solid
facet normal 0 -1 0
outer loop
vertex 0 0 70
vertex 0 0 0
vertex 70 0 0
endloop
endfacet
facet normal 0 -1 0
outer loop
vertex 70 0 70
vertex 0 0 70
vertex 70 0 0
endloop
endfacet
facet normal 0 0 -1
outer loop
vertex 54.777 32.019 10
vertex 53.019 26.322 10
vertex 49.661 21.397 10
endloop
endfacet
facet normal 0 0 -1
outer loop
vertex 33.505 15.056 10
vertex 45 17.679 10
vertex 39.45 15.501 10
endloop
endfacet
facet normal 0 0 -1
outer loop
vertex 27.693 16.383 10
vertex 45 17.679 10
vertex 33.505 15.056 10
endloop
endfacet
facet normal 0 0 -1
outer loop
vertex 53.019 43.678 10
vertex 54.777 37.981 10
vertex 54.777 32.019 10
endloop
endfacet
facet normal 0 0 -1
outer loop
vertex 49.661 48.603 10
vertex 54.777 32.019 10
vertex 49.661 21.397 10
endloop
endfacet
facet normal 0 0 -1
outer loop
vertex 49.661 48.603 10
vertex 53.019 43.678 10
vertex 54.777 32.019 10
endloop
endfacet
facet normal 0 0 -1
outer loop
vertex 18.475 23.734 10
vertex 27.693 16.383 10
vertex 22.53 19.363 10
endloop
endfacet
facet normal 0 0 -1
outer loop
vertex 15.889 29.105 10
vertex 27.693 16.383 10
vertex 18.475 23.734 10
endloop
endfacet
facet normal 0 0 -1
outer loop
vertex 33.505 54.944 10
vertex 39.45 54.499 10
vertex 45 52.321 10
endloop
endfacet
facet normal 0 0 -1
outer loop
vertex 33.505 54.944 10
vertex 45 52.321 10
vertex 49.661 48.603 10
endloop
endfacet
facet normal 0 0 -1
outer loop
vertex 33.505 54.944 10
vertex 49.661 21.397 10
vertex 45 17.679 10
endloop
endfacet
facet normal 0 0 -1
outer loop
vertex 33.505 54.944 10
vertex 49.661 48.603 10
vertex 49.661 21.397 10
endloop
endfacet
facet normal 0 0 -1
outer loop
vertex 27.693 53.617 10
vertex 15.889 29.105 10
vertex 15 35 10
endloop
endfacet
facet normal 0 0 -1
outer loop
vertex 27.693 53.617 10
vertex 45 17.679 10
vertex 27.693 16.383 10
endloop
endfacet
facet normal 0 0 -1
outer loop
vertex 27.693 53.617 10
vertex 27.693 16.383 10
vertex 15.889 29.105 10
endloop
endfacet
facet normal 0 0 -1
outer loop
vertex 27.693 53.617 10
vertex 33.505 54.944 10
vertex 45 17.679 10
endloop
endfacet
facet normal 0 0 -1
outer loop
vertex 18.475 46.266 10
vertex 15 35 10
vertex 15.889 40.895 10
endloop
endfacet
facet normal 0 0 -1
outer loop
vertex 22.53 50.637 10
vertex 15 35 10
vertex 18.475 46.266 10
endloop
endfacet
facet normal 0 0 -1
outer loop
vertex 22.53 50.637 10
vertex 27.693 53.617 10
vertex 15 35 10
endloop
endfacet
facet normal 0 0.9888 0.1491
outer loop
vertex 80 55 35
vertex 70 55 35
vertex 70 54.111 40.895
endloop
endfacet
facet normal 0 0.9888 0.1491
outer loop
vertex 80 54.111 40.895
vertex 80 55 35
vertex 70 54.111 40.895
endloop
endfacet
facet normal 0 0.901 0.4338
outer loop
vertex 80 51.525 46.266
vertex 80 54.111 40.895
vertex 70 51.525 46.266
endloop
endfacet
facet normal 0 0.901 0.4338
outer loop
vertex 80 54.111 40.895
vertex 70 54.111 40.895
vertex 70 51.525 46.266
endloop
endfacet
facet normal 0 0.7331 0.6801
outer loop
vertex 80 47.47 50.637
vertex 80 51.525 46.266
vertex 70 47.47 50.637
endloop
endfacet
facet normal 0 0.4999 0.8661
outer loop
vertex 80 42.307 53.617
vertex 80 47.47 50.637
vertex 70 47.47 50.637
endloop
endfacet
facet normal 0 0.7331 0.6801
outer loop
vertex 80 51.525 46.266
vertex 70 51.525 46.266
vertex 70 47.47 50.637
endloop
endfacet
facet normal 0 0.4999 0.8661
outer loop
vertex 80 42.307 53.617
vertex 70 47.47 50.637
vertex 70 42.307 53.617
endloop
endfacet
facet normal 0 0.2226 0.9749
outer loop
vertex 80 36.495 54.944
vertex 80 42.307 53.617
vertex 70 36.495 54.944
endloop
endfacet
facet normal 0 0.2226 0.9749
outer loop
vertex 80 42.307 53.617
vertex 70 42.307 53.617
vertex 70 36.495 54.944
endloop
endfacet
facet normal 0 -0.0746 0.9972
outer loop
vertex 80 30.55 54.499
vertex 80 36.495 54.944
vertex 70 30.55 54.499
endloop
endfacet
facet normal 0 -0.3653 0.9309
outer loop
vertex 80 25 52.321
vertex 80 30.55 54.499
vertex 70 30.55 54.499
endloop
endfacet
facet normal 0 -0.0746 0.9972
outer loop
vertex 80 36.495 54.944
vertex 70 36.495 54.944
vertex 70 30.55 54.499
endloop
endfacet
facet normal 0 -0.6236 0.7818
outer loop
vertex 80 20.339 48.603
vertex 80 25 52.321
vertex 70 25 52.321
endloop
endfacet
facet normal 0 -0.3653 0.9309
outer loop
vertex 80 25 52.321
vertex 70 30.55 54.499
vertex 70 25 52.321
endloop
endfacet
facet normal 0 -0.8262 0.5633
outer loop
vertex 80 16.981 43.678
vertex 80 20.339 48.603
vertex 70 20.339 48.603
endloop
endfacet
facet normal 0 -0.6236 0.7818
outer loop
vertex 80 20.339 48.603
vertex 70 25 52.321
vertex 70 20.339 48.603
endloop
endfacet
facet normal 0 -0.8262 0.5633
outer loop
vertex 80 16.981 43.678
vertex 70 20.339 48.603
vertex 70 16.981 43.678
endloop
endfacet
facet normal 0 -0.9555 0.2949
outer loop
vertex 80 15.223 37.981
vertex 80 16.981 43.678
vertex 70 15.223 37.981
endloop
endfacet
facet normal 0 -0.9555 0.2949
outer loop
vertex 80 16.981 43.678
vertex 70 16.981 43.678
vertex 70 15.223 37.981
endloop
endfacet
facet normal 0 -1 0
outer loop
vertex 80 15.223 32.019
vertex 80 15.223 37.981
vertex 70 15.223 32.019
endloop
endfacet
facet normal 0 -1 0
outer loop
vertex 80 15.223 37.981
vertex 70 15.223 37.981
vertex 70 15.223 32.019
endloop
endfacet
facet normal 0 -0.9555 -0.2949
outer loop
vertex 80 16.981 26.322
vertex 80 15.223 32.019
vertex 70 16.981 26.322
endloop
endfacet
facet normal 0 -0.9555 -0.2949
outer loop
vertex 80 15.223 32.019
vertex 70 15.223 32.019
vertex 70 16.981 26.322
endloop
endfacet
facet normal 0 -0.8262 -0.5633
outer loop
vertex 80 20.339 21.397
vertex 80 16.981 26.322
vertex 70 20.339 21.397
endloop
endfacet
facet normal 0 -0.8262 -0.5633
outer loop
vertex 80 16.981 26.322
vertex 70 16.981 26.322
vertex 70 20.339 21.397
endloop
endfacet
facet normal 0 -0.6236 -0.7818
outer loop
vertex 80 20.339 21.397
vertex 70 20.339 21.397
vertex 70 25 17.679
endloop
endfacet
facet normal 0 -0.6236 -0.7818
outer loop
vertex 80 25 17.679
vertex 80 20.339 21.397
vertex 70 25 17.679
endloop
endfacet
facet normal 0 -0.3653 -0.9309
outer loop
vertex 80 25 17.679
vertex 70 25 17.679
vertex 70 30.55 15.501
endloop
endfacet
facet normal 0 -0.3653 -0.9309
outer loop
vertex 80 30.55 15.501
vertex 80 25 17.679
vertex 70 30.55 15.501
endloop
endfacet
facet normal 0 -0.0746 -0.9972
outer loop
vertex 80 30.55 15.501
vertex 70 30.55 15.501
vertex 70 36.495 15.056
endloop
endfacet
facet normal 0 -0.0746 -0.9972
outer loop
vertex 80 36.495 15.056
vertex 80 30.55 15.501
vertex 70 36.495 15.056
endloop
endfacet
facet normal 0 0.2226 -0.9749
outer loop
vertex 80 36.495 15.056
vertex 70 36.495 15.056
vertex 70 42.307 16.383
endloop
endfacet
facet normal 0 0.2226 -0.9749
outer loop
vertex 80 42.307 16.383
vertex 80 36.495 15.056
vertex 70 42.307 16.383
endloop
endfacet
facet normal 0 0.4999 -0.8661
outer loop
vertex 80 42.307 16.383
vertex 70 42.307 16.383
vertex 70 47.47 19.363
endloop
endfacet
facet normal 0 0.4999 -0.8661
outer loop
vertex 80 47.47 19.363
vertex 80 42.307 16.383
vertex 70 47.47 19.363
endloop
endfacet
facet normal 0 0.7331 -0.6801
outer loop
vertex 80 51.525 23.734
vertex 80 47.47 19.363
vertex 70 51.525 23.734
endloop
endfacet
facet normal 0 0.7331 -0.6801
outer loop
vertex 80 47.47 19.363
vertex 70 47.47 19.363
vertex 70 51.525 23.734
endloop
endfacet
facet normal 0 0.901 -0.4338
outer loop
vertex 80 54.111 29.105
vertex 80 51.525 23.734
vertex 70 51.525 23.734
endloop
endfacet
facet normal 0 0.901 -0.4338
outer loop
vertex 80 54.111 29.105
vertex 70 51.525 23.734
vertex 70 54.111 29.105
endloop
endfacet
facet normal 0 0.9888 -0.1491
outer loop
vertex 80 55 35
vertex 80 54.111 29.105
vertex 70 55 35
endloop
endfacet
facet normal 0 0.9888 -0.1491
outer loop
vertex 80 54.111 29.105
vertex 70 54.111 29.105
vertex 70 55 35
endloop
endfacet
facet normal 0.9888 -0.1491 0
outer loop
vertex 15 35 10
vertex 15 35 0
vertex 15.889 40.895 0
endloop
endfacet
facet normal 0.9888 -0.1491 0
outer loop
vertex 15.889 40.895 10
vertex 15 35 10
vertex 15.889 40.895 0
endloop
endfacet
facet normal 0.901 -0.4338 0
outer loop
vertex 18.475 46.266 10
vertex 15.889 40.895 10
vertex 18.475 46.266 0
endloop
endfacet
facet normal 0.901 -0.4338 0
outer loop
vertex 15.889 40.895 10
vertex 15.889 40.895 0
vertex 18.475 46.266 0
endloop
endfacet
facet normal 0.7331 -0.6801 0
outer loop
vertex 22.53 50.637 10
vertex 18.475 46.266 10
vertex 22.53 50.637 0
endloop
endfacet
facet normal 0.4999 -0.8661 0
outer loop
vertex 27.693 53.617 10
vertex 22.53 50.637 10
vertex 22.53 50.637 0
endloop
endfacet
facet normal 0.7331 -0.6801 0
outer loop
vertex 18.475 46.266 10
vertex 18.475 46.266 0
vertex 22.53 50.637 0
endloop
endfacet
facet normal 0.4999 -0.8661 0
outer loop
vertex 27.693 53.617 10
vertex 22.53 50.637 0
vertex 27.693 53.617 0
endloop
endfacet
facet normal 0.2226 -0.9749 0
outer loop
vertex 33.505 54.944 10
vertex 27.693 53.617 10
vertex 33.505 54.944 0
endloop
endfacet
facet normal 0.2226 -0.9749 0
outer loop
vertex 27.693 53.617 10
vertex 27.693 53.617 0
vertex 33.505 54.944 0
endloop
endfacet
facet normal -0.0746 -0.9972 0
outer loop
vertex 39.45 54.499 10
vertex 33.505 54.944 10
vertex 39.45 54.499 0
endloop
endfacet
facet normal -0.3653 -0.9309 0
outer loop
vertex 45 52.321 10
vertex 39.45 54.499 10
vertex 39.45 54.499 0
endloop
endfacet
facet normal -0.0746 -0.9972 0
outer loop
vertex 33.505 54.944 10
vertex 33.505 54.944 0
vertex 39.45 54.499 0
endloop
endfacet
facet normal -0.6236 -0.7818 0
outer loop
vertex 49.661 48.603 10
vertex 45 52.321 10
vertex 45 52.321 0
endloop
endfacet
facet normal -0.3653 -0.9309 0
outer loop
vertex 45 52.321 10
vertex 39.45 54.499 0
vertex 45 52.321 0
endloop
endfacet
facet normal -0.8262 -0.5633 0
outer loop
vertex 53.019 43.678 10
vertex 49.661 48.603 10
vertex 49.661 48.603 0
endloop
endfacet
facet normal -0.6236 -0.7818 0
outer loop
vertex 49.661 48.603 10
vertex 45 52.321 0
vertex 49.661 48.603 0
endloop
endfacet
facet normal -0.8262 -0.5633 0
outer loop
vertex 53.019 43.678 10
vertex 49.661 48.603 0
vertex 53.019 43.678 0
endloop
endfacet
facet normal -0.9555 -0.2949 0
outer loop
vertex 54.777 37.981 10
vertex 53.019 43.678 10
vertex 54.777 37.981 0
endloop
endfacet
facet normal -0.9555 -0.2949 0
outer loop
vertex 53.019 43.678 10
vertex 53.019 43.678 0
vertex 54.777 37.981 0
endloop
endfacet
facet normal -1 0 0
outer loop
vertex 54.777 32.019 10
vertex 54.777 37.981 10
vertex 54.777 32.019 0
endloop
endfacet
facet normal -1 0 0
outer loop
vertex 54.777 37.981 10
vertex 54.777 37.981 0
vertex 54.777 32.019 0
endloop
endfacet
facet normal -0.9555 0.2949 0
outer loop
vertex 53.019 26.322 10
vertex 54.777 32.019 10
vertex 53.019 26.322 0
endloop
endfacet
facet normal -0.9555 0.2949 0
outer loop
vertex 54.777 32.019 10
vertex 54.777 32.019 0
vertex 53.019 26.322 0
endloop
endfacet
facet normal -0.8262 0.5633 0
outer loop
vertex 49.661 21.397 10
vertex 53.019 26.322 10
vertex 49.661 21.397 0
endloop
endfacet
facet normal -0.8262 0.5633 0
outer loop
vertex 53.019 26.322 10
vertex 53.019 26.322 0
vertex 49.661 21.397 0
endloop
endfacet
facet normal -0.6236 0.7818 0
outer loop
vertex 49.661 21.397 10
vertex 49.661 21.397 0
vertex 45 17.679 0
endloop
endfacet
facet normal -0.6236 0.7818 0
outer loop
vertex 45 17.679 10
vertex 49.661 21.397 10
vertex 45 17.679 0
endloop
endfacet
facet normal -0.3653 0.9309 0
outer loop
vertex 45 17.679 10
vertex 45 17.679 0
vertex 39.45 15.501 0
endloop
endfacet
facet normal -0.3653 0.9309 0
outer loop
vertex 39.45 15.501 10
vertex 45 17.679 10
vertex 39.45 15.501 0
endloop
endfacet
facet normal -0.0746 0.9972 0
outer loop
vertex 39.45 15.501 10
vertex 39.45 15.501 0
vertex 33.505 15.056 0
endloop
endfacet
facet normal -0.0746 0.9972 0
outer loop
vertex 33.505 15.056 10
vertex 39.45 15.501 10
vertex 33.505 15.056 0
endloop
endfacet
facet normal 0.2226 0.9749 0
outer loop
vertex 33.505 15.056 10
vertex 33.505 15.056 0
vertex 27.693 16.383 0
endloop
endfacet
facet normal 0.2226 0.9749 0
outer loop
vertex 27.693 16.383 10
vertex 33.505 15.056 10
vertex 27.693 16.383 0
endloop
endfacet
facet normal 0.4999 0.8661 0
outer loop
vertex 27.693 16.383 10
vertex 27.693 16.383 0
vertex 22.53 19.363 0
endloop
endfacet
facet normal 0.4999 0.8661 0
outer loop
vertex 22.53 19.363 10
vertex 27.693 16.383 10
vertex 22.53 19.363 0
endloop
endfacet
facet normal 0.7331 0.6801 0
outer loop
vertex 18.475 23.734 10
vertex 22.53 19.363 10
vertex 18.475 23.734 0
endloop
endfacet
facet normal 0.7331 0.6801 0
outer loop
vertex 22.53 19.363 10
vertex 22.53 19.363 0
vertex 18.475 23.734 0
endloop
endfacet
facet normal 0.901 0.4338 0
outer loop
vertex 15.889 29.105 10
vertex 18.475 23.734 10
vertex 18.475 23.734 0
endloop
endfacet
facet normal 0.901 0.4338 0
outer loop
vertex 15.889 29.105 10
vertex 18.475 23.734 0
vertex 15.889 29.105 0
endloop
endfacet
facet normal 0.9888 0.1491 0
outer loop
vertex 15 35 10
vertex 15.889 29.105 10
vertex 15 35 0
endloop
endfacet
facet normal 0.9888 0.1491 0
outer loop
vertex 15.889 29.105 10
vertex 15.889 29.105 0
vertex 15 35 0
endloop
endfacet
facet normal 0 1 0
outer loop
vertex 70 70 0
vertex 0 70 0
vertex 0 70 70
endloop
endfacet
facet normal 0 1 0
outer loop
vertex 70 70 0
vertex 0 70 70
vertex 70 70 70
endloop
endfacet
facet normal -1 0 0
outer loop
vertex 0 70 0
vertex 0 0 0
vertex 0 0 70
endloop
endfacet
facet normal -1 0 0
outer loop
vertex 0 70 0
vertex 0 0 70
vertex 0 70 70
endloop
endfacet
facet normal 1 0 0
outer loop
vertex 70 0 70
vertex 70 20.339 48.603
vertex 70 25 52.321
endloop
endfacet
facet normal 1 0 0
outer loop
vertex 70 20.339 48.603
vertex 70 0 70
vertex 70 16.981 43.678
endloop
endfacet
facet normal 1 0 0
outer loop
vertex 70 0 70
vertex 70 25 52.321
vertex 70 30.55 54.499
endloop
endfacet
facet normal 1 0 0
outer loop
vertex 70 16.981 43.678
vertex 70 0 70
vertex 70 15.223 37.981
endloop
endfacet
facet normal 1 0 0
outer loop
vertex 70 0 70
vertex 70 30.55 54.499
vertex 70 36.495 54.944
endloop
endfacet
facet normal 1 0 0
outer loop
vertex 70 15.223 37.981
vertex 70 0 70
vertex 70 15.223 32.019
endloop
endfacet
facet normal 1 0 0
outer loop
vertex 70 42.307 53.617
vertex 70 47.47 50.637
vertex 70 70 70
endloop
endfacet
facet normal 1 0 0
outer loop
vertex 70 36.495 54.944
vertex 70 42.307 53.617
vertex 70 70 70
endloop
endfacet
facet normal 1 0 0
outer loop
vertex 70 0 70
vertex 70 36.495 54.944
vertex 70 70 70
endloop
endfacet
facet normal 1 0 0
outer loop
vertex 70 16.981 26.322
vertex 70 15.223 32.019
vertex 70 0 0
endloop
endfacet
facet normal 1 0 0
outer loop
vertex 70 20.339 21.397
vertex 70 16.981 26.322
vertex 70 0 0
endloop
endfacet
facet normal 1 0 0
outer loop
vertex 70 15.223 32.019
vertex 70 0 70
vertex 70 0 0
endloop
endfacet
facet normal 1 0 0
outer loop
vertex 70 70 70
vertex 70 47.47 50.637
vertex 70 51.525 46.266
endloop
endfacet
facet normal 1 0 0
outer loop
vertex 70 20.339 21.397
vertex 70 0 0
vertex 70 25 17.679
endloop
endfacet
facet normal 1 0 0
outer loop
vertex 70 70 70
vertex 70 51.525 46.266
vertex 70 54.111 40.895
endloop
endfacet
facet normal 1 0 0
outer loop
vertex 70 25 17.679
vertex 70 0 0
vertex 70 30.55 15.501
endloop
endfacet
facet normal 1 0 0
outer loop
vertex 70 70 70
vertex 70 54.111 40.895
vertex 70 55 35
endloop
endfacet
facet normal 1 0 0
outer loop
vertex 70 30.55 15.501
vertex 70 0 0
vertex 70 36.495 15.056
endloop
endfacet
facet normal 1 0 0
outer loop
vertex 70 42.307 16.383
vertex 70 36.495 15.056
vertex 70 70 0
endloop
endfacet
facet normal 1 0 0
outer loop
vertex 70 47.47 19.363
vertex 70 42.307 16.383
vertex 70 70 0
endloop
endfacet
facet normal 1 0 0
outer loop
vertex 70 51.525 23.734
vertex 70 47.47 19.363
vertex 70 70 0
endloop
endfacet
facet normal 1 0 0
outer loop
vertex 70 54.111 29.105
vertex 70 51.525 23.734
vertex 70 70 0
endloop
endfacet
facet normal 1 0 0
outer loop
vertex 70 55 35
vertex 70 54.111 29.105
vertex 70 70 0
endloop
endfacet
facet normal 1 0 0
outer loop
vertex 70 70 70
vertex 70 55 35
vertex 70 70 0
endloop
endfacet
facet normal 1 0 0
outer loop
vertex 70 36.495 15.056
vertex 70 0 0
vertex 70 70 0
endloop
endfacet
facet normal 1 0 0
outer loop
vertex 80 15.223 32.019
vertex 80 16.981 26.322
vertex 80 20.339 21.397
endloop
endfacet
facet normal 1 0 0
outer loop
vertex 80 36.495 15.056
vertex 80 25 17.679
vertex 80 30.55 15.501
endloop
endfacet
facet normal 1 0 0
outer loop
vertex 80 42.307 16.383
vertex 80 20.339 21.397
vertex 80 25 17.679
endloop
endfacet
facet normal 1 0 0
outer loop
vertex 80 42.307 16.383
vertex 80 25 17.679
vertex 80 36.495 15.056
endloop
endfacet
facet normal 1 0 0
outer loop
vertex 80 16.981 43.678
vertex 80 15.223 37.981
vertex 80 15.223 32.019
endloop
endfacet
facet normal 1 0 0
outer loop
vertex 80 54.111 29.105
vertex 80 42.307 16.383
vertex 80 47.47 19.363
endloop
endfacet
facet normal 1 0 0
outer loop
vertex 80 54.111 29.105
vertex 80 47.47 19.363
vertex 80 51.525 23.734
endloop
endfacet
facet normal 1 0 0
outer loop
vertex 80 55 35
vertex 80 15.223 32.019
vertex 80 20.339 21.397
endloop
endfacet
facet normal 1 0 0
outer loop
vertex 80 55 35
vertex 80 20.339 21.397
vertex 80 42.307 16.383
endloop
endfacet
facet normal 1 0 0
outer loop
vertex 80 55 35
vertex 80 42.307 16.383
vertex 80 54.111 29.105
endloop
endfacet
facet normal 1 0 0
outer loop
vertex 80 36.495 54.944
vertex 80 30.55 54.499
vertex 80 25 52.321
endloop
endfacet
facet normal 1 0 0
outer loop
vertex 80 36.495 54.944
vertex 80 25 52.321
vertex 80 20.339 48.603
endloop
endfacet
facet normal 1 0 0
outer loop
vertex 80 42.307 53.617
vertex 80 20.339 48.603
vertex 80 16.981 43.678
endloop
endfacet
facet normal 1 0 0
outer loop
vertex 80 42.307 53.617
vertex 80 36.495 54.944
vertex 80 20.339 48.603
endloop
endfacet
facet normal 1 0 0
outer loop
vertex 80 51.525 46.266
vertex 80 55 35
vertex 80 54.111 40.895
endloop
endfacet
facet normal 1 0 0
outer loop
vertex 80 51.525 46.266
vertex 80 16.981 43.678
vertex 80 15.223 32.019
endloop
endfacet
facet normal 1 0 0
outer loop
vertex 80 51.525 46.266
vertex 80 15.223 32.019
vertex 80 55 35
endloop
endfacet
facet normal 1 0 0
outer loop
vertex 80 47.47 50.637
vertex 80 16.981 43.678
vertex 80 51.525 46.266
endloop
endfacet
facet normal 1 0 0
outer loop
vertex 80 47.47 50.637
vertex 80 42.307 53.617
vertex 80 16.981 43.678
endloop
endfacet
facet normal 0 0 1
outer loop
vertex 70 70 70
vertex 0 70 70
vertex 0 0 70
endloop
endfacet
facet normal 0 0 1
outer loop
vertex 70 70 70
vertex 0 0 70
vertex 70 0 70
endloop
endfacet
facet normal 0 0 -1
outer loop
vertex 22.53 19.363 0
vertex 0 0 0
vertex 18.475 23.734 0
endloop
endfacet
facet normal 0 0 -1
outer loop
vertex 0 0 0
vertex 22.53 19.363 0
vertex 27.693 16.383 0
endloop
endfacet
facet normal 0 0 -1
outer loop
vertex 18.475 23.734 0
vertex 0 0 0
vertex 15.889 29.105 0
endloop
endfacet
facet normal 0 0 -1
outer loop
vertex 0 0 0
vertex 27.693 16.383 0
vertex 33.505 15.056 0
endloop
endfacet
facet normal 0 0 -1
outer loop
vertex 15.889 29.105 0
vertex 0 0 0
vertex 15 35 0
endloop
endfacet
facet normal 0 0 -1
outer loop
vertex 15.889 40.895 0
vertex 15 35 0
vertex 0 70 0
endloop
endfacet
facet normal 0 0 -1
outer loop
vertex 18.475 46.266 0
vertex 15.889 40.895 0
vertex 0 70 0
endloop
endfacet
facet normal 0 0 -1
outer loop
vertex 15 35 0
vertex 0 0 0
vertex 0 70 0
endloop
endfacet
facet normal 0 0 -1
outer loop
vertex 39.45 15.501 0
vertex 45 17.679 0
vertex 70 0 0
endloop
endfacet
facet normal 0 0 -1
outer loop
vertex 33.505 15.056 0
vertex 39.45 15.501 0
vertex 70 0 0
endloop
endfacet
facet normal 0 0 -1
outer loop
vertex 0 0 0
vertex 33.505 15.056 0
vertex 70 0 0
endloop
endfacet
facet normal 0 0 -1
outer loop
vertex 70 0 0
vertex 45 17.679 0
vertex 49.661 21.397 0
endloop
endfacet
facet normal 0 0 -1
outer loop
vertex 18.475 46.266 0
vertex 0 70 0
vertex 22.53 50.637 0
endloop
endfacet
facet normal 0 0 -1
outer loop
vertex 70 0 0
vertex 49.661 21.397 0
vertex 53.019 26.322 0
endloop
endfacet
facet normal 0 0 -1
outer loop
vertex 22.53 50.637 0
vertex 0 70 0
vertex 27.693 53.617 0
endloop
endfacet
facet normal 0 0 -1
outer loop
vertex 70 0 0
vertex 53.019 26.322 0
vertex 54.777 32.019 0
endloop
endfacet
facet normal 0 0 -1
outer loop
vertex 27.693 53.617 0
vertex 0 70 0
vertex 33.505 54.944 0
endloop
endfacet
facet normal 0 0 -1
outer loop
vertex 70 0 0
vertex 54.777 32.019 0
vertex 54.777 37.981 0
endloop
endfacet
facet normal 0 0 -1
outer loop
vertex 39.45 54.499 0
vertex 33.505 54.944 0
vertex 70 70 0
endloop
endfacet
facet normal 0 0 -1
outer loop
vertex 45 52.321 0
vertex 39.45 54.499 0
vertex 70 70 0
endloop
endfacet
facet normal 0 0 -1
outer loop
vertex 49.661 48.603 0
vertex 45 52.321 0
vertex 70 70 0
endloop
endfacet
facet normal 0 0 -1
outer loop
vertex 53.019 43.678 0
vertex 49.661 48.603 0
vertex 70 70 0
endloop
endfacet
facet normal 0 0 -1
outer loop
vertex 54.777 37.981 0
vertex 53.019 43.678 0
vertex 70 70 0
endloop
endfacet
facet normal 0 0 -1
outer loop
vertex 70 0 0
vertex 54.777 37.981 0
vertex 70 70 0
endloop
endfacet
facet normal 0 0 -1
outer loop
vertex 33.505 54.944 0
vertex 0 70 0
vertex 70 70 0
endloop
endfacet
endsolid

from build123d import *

# Parameters (mm, degrees)
CROQUIS1_W              = 70
CROQUIS1_H              = 70
SALIENTE_EXTRUIR1_DEPTH = 70
CROQUIS2_R              = 20
SALIENTE_EXTRUIR2_DEPTH = 10
CROQUIS3_R              = 20
CORTAR_EXTRUIR1_DEPTH   = 10


with BuildPart() as part:
    # Croquis1 → Saliente-Extruir1 (new body)
    with BuildSketch(Plane.XY):
        with Locations((35, 35)):
            Rectangle(CROQUIS1_W, CROQUIS1_H)
    extrude(amount=SALIENTE_EXTRUIR1_DEPTH)

    # Croquis2 → Saliente-Extruir2 (add)
    with BuildSketch(Plane(origin=(70, 0, 0), x_dir=(0, 0, -1), z_dir=(1, 0, 0))):
        with Locations(Location((-35, 35, 0), (0, 0, 90))):
            Circle(CROQUIS2_R)
    extrude(amount=SALIENTE_EXTRUIR2_DEPTH)

    # Croquis3 → Cortar-Extruir1 (cut)
    with BuildSketch(Plane(origin=(0, 0, 0), x_dir=(-1, 0, 0), z_dir=(0, 0, -1))):
        with Locations((-35, 35)):
            Circle(CROQUIS3_R)
    extrude(amount=-CORTAR_EXTRUIR1_DEPTH, mode=Mode.SUBTRACT)


solid = part.part
